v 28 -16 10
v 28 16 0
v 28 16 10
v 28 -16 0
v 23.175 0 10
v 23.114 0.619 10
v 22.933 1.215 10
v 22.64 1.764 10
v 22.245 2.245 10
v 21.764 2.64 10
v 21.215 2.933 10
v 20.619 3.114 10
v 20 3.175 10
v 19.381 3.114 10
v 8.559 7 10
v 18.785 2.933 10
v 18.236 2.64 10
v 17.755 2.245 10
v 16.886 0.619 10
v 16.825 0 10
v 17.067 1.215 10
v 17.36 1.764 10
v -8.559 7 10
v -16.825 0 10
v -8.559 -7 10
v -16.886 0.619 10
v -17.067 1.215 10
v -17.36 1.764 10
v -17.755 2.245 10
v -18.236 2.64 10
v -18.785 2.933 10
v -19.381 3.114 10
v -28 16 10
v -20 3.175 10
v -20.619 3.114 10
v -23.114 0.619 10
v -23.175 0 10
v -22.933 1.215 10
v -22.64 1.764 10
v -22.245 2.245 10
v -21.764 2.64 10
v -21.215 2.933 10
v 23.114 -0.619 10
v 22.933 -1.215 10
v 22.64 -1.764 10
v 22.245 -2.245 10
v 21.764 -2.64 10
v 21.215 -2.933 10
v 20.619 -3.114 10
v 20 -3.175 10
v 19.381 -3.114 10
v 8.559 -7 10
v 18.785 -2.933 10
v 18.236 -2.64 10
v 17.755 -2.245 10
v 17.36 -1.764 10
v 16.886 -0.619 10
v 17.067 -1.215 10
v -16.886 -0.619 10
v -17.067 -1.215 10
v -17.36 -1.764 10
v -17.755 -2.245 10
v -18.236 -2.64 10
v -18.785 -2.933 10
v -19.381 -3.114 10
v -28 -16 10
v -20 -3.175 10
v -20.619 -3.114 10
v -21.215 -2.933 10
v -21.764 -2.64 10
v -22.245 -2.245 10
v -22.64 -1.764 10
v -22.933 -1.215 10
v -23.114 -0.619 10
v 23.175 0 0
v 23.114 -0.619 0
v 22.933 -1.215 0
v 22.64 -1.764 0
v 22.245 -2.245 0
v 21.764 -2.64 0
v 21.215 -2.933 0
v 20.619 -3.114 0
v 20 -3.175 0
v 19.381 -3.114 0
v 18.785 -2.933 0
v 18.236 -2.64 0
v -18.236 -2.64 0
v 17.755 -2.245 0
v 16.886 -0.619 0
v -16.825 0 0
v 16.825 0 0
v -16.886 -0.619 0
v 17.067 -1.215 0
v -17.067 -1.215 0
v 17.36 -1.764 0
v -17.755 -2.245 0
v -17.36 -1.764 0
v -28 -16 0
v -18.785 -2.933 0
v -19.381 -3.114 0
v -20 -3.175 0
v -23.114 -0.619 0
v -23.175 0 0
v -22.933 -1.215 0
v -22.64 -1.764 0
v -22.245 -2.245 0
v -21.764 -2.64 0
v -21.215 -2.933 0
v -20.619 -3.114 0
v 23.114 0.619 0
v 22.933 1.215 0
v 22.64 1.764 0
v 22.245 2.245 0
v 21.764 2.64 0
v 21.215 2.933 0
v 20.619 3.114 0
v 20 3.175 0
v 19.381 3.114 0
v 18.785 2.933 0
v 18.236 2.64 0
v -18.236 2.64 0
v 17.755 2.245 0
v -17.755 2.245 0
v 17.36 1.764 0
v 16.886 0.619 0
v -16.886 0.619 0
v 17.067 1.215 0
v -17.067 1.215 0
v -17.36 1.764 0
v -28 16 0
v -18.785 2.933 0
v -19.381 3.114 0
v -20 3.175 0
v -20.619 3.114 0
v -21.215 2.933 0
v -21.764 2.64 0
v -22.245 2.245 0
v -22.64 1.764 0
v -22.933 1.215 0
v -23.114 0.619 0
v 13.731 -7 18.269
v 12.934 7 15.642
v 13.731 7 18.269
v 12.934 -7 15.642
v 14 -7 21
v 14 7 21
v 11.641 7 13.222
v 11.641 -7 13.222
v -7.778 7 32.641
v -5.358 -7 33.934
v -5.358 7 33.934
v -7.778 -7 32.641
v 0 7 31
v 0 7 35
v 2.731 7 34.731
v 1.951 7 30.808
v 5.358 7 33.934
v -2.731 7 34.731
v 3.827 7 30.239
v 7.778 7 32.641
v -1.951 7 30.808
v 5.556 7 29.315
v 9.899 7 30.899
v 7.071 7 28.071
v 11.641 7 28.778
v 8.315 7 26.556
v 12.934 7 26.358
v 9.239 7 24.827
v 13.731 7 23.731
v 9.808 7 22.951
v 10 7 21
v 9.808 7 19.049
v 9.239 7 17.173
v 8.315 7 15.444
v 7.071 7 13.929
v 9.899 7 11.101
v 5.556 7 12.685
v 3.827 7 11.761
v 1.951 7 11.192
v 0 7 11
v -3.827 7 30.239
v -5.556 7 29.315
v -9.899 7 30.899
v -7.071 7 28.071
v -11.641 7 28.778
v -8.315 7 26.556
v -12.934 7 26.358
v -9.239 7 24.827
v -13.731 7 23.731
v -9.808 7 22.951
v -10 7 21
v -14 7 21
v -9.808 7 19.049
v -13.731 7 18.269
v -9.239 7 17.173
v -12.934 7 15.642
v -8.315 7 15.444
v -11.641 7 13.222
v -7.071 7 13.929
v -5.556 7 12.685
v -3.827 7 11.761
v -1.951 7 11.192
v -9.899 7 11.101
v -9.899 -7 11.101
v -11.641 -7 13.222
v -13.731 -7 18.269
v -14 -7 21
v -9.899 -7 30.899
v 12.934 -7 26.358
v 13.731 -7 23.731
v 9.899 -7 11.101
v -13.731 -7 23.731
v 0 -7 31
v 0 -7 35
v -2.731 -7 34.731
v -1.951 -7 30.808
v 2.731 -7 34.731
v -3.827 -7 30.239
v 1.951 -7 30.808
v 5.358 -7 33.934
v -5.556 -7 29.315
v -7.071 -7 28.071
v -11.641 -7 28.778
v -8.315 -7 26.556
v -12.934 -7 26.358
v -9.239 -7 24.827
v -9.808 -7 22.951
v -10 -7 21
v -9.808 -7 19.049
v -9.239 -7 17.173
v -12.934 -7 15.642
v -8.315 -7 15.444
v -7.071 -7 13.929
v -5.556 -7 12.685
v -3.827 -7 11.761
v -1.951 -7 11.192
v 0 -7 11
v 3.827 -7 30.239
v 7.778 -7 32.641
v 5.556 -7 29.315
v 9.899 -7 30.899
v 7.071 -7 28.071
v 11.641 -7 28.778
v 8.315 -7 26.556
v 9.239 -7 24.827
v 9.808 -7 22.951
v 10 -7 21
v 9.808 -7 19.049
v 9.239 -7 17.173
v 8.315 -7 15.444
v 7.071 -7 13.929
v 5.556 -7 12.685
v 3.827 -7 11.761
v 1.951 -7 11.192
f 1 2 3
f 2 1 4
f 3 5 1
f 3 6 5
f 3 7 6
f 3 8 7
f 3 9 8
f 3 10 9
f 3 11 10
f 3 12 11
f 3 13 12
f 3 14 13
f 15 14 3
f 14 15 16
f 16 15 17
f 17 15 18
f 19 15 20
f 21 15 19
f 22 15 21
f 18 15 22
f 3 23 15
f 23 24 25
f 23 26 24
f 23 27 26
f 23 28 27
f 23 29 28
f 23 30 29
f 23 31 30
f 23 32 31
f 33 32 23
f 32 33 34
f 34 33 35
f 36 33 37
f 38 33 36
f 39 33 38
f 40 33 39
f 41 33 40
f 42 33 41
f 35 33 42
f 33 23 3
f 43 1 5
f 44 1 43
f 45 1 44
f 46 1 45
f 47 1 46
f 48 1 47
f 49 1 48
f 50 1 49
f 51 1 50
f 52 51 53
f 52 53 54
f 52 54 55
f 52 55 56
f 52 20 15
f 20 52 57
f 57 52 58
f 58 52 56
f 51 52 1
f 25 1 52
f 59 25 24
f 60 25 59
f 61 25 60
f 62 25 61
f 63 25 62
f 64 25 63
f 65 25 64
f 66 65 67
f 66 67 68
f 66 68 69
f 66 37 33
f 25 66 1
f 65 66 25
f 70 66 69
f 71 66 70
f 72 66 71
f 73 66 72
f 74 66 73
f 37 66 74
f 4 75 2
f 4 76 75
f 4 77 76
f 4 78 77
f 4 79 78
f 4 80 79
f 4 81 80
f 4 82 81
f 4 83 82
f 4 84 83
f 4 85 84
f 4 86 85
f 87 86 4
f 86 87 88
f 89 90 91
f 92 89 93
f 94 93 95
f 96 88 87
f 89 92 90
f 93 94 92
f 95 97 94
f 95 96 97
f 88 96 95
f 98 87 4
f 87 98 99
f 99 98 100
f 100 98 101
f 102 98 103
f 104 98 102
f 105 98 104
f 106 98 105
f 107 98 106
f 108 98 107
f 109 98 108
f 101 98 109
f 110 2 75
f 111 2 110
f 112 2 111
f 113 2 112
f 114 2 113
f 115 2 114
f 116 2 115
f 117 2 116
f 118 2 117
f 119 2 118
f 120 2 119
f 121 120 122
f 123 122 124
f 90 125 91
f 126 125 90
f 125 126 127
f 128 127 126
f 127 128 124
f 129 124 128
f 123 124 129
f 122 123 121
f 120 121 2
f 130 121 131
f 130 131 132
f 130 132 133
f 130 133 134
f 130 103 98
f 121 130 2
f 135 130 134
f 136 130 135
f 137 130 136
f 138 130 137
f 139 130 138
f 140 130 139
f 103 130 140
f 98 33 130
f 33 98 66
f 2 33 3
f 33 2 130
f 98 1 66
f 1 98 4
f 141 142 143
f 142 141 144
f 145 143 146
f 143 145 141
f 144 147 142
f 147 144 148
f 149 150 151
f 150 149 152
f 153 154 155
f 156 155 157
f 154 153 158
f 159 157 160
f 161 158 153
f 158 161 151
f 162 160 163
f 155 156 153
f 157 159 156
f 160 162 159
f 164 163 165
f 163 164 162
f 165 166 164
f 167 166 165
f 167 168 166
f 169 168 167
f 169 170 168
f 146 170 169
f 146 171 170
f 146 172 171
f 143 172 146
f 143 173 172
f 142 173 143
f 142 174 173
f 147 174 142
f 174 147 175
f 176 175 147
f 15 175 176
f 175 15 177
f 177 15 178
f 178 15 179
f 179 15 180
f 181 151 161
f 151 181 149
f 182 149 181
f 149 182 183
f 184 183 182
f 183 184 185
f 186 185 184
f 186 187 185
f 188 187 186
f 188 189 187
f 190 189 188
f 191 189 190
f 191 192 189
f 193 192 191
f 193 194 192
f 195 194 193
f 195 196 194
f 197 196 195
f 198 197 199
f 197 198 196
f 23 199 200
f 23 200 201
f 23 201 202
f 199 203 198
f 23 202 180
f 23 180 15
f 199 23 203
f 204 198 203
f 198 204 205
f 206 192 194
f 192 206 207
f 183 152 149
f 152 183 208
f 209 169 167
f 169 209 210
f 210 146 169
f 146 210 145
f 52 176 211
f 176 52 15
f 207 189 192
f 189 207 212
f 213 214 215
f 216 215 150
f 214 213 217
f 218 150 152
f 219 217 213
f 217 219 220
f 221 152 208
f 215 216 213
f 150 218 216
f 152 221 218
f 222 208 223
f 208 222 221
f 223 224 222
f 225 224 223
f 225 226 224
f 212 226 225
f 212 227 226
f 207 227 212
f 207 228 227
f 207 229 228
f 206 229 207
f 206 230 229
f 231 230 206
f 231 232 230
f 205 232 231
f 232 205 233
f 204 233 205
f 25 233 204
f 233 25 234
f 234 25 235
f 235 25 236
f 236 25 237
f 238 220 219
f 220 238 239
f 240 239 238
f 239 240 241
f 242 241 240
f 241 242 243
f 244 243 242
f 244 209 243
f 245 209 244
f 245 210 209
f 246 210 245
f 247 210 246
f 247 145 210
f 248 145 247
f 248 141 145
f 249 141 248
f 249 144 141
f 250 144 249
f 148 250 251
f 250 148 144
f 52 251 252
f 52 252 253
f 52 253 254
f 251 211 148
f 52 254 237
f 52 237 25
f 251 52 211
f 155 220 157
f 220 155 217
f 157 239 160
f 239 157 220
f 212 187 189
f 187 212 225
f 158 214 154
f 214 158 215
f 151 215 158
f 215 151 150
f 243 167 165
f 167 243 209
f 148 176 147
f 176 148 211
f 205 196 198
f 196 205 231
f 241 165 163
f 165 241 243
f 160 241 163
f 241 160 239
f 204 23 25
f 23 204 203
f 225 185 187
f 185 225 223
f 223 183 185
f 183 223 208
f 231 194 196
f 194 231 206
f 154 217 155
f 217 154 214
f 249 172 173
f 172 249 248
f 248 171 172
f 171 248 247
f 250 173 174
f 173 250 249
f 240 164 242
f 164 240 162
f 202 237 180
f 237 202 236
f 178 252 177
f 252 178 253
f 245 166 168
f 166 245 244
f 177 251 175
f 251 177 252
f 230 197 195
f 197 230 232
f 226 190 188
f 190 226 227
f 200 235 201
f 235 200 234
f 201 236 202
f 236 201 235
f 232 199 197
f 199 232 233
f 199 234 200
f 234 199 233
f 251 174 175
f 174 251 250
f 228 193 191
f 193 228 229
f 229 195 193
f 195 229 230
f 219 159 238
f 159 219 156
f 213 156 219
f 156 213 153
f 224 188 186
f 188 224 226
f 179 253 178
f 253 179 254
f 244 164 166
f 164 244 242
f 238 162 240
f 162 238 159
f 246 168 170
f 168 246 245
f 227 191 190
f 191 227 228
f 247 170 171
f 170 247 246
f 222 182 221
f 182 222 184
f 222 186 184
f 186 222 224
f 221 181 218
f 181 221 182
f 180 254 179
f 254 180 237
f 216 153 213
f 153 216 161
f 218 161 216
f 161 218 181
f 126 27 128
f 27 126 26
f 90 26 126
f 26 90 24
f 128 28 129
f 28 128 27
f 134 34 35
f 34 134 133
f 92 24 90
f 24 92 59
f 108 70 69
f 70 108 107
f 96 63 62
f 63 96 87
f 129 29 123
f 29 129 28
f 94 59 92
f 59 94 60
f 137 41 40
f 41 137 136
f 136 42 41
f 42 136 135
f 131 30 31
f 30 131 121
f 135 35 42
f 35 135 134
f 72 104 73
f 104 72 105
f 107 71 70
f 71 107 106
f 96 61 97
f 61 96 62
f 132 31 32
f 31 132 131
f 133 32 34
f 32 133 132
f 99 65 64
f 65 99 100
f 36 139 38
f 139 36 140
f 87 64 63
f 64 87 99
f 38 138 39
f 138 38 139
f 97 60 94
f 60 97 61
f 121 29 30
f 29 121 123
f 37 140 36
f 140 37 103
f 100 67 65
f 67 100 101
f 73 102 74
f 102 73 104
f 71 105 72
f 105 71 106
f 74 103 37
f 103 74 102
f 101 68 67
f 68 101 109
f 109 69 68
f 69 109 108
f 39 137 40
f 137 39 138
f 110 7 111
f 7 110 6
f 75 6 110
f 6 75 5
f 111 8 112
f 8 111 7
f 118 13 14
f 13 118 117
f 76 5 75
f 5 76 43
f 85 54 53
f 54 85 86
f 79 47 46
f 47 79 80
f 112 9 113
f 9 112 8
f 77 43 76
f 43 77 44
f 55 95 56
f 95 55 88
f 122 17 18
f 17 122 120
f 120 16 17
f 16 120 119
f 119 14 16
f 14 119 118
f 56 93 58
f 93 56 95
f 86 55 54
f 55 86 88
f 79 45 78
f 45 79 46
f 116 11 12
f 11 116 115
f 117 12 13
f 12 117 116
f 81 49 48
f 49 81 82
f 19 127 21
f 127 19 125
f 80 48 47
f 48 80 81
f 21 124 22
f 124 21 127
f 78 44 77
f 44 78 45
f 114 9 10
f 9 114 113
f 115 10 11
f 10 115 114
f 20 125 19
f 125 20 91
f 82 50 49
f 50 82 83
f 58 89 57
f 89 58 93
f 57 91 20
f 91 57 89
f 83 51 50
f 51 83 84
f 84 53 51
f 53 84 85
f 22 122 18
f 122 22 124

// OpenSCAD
$fn = 32;

// ----------------------------------------------------------------------
// Deck eye: 28 mm eye on a 56 mm base
// ----------------------------------------------------------------------

// --- parameters (mm) ---
base_l = 56;              // base length
base_w = 32;              // base width
base_t = 10;              // base thickness
eye_r = 14;               // eye outside radius
eye_bore = 20;            // eye bore diameter
eye_w = 14;               // eye thickness
eye_z = 21;               // eye centre height
holes_d = 6.35;           // fixing holes
hole_x = 20;              // fixing hole spacing

difference() {
  union() {
    translate([-28, -16, 0]) cube([base_l, base_w, base_t]);
    /* eye standing upright, its foot sunk 3 mm into the base */
    translate([0, -7, 21]) rotate([-90, 0, 0]) cylinder(h = 14, d = 28);
  }
  /* eye bore, 2.5 mm clear of both faces */
  translate([0, -9.5, 21]) rotate([-90, 0, 0]) cylinder(h = 19, d = 20);
  translate([-20, 0, -2.5]) cylinder(h = base_t + 5, d = holes_d);
  translate([20, 0, -2.5]) cylinder(h = base_t + 5, d = holes_d);
}
